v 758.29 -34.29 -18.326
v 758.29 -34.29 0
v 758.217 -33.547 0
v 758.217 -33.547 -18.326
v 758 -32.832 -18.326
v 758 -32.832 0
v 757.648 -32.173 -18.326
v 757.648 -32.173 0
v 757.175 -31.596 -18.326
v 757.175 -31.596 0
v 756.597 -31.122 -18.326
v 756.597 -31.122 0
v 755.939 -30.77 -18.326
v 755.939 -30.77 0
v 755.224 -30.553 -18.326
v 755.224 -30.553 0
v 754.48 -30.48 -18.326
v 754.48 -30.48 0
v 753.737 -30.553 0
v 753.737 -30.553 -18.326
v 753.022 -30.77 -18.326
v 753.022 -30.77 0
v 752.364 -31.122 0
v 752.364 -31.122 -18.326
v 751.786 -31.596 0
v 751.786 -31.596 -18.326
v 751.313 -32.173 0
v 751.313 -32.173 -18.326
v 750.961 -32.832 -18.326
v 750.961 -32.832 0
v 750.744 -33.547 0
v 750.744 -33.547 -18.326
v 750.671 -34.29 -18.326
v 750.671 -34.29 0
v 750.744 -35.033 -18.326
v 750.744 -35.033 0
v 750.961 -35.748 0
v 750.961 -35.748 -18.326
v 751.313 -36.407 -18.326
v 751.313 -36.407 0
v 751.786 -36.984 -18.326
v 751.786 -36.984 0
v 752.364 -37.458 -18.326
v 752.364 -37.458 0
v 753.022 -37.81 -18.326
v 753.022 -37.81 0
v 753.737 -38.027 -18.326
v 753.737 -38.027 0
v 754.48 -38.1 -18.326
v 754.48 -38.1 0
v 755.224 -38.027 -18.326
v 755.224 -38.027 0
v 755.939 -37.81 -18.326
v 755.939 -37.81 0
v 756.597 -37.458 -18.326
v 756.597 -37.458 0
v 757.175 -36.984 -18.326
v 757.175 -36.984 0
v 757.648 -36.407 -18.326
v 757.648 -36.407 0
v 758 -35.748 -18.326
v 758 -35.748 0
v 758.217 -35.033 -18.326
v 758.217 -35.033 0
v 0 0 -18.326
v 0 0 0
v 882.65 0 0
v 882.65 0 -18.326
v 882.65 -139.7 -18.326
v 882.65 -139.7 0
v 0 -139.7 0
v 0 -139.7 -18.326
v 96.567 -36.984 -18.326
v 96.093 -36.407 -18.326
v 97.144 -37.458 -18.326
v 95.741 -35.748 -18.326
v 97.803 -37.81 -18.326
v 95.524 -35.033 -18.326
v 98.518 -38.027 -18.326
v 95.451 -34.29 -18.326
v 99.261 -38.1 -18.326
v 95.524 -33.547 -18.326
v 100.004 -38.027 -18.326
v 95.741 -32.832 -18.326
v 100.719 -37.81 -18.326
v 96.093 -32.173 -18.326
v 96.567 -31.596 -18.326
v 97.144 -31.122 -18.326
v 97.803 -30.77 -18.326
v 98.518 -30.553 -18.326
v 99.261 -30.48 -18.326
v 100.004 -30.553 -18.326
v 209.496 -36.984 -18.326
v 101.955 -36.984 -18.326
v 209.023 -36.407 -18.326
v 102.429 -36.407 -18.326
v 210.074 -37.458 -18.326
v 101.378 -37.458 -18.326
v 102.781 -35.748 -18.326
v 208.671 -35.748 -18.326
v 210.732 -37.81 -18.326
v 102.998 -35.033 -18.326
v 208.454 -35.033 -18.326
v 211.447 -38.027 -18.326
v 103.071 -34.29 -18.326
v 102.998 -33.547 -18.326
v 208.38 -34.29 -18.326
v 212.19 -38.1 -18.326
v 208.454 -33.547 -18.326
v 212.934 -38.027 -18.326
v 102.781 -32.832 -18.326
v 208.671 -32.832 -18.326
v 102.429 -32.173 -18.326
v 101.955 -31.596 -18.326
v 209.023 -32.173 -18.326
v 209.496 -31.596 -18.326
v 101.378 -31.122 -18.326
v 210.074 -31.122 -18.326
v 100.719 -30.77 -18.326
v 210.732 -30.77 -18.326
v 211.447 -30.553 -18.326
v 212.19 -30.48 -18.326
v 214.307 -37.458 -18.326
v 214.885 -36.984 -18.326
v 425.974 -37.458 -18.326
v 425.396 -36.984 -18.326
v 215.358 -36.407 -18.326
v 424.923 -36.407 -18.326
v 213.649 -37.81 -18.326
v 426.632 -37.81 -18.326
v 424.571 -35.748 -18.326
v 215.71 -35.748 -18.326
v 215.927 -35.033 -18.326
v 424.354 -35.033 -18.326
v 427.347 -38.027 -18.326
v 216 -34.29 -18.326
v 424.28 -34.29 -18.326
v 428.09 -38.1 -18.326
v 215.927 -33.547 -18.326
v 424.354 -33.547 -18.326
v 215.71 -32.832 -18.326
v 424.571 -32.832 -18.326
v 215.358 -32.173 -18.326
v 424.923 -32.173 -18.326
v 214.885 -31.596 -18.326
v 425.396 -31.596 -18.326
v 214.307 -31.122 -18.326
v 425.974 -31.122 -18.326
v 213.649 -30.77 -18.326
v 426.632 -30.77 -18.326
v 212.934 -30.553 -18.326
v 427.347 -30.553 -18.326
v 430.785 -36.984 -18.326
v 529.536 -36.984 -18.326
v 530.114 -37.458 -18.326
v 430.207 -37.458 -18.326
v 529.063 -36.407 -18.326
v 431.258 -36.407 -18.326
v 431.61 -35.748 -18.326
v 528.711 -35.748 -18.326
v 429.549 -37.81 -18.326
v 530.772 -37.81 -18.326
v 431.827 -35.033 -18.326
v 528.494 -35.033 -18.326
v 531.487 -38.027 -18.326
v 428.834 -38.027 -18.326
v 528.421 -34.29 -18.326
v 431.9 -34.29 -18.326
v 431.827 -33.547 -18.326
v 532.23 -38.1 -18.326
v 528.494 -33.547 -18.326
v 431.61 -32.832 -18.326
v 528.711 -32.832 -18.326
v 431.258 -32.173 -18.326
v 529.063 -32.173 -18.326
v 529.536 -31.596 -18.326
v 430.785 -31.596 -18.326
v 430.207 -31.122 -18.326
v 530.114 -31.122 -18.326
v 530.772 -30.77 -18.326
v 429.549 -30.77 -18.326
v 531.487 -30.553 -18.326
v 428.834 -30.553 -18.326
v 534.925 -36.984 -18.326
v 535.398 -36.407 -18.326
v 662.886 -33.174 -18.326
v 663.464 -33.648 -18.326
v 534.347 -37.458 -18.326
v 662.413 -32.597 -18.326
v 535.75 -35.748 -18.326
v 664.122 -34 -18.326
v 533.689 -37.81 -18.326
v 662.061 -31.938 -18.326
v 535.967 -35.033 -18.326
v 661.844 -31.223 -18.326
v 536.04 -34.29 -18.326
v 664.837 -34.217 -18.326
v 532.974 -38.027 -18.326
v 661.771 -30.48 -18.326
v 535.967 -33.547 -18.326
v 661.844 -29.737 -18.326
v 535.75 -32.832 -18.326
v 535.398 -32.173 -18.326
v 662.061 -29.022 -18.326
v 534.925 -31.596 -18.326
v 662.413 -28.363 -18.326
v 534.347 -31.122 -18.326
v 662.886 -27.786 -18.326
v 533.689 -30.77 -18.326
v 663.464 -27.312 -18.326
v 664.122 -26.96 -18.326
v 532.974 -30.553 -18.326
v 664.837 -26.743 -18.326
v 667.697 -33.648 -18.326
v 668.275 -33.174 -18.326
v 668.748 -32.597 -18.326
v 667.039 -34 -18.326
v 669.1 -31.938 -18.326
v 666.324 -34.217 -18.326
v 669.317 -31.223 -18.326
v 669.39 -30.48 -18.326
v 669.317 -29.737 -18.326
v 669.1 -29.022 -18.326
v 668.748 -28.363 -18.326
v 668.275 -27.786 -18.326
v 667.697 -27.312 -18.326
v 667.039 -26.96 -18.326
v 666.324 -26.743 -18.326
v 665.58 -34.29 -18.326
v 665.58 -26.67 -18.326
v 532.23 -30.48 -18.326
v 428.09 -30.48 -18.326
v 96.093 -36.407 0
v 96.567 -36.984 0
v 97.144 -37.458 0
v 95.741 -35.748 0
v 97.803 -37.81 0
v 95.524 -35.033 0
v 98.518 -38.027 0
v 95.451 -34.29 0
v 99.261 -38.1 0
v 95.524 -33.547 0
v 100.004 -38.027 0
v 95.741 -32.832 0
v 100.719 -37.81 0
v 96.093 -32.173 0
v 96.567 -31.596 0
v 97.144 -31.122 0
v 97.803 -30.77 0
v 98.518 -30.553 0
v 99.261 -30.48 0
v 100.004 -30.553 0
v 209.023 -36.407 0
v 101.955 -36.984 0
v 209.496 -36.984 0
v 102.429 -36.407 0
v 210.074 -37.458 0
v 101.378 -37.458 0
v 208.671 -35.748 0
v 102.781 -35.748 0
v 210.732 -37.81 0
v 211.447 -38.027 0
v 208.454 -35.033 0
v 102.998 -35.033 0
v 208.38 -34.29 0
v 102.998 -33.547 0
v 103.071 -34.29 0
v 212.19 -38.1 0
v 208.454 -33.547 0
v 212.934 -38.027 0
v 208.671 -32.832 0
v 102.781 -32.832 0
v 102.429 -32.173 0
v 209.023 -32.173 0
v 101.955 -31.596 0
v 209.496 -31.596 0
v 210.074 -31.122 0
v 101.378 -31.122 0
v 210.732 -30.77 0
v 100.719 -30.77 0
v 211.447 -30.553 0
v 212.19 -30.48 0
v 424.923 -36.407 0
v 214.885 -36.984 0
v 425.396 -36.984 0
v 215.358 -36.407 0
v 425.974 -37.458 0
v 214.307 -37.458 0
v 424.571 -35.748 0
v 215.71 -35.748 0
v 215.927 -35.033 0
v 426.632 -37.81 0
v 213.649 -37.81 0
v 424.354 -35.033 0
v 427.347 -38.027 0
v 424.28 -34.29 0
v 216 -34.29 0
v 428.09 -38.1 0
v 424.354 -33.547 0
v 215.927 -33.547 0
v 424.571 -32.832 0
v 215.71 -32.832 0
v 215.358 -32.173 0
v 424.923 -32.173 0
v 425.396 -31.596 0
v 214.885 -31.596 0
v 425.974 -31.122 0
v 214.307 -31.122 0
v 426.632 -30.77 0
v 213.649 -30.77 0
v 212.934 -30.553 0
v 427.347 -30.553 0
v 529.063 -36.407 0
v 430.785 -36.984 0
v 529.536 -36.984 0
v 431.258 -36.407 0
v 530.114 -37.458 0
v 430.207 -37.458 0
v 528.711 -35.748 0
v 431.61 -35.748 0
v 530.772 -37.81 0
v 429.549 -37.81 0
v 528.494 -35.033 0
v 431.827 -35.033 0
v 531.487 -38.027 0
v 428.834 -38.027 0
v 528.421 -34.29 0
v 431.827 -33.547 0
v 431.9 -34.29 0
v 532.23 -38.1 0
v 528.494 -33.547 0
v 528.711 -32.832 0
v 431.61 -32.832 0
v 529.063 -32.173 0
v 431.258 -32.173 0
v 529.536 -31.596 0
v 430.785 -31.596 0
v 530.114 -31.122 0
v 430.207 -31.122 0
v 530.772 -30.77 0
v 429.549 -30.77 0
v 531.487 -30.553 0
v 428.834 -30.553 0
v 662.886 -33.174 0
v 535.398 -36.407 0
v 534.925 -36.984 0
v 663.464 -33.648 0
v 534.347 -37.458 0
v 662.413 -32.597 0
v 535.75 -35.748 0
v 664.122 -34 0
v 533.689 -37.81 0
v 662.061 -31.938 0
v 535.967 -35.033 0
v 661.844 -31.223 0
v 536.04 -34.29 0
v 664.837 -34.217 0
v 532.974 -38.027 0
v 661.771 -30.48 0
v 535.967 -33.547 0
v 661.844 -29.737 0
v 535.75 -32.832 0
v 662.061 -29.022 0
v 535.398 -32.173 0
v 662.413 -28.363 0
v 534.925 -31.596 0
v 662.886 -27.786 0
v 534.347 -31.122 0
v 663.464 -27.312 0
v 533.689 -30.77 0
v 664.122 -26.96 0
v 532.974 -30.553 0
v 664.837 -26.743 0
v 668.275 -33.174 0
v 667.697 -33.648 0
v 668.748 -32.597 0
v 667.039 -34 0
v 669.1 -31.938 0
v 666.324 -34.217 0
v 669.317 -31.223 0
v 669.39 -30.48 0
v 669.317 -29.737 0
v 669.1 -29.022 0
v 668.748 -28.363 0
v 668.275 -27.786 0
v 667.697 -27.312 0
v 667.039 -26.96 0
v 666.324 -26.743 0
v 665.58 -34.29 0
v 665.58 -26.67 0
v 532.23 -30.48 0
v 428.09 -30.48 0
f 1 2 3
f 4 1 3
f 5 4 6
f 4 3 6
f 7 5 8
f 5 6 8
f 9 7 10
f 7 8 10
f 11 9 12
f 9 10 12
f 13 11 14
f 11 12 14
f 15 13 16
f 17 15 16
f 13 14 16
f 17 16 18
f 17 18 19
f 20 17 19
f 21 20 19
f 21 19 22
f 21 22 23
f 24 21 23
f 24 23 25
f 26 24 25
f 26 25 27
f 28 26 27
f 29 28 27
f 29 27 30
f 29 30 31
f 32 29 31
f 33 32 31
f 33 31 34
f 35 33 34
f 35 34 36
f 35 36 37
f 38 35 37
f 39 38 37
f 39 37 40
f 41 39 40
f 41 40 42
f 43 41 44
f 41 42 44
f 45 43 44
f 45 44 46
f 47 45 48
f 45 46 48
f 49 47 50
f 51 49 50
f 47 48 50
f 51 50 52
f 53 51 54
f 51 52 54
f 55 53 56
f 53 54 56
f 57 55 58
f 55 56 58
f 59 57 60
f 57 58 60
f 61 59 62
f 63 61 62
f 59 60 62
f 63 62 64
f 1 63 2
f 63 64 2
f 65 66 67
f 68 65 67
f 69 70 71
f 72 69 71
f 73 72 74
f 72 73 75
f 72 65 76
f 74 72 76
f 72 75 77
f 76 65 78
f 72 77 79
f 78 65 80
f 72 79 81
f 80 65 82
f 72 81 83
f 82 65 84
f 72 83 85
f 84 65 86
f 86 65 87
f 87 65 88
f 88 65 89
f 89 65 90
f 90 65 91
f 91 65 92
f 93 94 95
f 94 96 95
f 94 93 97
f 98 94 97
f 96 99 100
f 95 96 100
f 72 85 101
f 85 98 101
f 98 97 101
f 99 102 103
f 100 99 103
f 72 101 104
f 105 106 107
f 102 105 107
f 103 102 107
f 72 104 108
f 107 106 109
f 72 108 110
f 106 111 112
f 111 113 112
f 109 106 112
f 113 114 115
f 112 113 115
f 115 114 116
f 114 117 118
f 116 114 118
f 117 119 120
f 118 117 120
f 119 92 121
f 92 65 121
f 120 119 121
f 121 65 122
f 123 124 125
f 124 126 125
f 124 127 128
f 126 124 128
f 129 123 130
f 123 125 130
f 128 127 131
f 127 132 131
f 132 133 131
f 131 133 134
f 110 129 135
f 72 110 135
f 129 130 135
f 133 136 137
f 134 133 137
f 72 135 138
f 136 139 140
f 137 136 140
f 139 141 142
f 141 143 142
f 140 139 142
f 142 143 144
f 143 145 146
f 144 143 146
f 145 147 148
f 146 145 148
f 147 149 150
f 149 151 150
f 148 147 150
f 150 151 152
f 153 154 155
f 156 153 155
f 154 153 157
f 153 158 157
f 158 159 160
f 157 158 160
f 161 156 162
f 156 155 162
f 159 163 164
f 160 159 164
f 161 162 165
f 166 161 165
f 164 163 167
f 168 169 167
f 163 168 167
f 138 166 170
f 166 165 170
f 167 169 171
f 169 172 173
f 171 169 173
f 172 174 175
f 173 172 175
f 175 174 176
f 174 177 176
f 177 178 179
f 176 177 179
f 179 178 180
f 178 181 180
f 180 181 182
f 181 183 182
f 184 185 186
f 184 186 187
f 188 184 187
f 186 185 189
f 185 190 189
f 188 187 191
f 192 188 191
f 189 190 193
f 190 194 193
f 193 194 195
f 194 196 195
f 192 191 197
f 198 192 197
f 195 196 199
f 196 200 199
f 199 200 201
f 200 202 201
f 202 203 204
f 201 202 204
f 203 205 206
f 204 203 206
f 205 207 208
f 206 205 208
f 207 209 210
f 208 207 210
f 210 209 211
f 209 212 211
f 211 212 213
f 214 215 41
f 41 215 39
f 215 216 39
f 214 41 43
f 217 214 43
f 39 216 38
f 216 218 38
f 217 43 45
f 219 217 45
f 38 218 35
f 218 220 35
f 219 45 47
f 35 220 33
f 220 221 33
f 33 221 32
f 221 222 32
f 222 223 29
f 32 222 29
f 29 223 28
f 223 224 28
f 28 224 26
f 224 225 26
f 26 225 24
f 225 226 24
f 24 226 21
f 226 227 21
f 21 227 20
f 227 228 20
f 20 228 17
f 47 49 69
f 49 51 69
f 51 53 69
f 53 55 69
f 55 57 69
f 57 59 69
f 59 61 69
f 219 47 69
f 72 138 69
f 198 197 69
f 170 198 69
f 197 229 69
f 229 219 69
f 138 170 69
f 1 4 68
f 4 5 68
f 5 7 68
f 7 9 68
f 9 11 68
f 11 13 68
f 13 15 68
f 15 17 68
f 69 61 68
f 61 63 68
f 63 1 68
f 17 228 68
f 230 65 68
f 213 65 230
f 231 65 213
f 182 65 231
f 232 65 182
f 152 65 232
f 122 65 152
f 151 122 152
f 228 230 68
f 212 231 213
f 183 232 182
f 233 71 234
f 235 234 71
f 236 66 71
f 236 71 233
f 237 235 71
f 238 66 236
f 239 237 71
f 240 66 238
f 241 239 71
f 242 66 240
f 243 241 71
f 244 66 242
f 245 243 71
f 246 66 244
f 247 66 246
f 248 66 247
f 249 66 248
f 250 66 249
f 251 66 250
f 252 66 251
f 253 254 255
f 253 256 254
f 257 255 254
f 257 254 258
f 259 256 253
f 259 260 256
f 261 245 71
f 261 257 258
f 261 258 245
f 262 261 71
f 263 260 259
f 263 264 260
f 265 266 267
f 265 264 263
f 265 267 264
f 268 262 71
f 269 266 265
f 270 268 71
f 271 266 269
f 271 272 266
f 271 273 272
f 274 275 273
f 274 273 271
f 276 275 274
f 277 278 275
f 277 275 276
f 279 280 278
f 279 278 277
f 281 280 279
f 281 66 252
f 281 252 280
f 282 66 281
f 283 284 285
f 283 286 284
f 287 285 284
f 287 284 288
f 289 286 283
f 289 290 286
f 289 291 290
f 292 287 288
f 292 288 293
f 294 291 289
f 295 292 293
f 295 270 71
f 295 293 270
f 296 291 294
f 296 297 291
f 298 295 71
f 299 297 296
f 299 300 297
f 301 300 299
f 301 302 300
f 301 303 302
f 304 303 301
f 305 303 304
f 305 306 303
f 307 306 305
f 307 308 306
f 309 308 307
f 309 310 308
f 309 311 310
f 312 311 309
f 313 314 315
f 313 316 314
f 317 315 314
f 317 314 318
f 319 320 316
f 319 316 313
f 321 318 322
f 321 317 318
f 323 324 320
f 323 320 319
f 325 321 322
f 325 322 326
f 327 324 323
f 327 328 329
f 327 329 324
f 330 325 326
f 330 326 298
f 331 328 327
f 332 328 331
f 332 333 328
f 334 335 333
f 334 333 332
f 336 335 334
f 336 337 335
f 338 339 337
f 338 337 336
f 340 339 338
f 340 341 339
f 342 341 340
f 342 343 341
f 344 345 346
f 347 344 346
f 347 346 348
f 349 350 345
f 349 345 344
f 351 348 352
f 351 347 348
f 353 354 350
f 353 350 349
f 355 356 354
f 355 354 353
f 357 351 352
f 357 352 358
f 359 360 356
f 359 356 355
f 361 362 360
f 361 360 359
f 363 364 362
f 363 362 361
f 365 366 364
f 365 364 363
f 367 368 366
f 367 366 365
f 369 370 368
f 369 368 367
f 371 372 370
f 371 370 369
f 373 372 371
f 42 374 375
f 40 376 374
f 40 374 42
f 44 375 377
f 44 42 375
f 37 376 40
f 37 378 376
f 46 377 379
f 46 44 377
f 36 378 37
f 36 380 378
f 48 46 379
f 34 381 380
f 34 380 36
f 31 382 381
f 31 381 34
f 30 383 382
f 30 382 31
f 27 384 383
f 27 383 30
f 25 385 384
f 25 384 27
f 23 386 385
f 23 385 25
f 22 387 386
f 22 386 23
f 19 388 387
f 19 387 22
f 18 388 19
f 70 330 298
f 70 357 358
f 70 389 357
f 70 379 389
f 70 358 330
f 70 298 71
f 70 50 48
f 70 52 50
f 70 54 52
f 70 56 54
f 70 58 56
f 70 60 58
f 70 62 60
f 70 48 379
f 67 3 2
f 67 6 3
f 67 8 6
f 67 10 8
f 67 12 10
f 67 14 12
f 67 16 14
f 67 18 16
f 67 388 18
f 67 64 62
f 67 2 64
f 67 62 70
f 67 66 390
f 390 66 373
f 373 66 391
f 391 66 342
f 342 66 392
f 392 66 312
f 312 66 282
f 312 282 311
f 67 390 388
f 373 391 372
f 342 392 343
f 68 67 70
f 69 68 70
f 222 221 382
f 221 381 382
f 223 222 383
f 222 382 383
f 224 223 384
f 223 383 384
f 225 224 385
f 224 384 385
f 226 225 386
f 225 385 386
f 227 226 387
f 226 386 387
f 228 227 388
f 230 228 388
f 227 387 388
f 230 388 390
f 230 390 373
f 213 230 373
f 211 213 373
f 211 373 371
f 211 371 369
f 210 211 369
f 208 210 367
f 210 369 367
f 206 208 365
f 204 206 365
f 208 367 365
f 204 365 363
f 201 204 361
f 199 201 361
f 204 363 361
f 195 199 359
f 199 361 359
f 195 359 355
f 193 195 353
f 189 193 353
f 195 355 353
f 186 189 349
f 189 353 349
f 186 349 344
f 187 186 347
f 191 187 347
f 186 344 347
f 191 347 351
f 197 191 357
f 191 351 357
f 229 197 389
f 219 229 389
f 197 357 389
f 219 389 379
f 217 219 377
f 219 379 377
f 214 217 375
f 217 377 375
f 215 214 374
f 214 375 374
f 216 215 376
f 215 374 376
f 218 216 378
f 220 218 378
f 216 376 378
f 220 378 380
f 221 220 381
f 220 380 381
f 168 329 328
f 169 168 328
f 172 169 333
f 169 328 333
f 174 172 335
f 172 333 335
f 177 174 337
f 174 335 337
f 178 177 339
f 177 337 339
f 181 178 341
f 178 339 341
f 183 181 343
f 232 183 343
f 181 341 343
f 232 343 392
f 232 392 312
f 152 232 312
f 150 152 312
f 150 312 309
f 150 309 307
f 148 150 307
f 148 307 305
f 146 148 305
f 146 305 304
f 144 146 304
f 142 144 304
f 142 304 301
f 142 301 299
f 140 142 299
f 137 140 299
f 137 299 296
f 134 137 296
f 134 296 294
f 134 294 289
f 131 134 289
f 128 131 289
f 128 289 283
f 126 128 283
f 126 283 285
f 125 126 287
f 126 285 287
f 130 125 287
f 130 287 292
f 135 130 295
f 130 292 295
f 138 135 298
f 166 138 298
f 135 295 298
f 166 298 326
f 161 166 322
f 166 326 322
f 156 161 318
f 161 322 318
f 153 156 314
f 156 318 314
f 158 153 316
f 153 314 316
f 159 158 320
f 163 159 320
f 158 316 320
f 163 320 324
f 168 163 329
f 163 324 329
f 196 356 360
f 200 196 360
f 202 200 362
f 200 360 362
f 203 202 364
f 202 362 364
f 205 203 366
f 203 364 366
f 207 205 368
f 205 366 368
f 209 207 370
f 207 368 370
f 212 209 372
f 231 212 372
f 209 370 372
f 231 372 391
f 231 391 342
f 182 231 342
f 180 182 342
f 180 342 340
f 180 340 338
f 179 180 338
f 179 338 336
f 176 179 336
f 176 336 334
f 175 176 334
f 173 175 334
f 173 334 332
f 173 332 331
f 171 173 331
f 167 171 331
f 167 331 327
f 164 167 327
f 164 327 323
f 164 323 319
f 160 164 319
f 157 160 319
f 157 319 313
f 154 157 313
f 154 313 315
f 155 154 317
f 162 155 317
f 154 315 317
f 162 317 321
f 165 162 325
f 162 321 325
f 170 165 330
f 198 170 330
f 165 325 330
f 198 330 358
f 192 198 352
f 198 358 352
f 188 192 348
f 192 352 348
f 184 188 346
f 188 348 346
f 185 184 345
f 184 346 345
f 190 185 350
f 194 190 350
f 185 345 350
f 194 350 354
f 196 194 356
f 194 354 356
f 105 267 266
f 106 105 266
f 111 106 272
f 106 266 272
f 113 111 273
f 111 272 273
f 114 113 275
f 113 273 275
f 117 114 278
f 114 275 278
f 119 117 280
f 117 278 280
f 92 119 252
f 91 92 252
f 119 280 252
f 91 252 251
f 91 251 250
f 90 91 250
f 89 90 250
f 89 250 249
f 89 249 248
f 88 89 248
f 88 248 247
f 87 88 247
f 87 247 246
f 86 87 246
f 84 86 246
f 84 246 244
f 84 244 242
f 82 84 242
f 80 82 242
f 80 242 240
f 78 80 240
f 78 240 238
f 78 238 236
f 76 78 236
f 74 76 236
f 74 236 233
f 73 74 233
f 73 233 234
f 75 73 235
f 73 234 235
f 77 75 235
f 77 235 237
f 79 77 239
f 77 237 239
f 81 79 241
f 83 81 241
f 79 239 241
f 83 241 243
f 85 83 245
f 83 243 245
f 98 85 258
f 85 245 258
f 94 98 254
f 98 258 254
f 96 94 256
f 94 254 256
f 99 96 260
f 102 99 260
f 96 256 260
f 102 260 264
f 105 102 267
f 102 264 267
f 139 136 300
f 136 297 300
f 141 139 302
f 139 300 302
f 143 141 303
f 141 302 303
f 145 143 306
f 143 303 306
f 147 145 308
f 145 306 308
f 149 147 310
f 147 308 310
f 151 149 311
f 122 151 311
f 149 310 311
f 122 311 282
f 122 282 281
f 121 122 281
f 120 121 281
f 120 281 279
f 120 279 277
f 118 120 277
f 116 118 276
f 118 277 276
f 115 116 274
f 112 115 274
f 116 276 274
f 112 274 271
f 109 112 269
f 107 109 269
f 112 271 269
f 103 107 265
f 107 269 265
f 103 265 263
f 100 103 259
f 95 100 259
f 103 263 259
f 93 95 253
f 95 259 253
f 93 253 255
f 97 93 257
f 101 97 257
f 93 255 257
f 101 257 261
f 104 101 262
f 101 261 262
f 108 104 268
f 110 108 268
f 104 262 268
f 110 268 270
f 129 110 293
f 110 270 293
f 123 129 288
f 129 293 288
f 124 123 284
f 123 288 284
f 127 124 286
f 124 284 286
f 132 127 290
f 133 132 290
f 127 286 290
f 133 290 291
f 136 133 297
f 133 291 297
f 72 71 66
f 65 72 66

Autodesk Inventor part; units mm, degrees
ref_plane "YZ Plane" through (0, 0, 0) normal (1, 0, 0) x (0, 1, 0)
ref_plane "XZ Plane" through (0, 0, 0) normal (0, 1, 0) x (-1, 0, 0)
ref_plane "XY Plane" through (0, 0, 0) normal (0, 0, 1) x (1, 0, 0)
sketch "Sketch1" plane through (0, 0, 0) normal (0, 0, 1) x (1, 0, 0)
  line L0 (0, 0) -> (882.65, 0)
  line L1 (882.65, 0) -> (882.65, -139.7)
  line L2 (882.65, -139.7) -> (0, -139.7)
  line L3 (0, -139.7) -> (0, 0)
  circle A0 centre (754.4805, -34.29) radius 3.81
  circle A1 centre (665.5805, -30.48) radius 3.81
  circle A2 centre (532.2305, -34.29) radius 3.81
  circle A3 centre (428.0905, -34.29) radius 3.81
  circle A4 centre (212.1905, -34.29) radius 3.81
  circle A5 centre (99.2611, -34.29) radius 3.81
  dimension "d0" = 882.65
  dimension "d1" = 139.7
  dimension "d2" = 7.62
  dimension "d4" = 7.62
  dimension "d6" = 7.62
  dimension "d8" = 7.62
  dimension "d9" = 104.14
  dimension "d10" = 7.62
  dimension "d11" = 215.9
  dimension "d12" = 7.62
  dimension "d16" = 105.41
  dimension "d17" = 105.41
  dimension "d18" = 105.41
  dimension "d19" = 105.41
  dimension "d21" = 105.41
  dimension "d22" = 105.41
  dimension "d23" = 88.9
  dimension "d24" = 133.35
extrude "Extrusion1" add sketch "Sketch1" against normal blind 18.3261
properties part number "Kermit bumper 2 large ( middle not finished yet)"
